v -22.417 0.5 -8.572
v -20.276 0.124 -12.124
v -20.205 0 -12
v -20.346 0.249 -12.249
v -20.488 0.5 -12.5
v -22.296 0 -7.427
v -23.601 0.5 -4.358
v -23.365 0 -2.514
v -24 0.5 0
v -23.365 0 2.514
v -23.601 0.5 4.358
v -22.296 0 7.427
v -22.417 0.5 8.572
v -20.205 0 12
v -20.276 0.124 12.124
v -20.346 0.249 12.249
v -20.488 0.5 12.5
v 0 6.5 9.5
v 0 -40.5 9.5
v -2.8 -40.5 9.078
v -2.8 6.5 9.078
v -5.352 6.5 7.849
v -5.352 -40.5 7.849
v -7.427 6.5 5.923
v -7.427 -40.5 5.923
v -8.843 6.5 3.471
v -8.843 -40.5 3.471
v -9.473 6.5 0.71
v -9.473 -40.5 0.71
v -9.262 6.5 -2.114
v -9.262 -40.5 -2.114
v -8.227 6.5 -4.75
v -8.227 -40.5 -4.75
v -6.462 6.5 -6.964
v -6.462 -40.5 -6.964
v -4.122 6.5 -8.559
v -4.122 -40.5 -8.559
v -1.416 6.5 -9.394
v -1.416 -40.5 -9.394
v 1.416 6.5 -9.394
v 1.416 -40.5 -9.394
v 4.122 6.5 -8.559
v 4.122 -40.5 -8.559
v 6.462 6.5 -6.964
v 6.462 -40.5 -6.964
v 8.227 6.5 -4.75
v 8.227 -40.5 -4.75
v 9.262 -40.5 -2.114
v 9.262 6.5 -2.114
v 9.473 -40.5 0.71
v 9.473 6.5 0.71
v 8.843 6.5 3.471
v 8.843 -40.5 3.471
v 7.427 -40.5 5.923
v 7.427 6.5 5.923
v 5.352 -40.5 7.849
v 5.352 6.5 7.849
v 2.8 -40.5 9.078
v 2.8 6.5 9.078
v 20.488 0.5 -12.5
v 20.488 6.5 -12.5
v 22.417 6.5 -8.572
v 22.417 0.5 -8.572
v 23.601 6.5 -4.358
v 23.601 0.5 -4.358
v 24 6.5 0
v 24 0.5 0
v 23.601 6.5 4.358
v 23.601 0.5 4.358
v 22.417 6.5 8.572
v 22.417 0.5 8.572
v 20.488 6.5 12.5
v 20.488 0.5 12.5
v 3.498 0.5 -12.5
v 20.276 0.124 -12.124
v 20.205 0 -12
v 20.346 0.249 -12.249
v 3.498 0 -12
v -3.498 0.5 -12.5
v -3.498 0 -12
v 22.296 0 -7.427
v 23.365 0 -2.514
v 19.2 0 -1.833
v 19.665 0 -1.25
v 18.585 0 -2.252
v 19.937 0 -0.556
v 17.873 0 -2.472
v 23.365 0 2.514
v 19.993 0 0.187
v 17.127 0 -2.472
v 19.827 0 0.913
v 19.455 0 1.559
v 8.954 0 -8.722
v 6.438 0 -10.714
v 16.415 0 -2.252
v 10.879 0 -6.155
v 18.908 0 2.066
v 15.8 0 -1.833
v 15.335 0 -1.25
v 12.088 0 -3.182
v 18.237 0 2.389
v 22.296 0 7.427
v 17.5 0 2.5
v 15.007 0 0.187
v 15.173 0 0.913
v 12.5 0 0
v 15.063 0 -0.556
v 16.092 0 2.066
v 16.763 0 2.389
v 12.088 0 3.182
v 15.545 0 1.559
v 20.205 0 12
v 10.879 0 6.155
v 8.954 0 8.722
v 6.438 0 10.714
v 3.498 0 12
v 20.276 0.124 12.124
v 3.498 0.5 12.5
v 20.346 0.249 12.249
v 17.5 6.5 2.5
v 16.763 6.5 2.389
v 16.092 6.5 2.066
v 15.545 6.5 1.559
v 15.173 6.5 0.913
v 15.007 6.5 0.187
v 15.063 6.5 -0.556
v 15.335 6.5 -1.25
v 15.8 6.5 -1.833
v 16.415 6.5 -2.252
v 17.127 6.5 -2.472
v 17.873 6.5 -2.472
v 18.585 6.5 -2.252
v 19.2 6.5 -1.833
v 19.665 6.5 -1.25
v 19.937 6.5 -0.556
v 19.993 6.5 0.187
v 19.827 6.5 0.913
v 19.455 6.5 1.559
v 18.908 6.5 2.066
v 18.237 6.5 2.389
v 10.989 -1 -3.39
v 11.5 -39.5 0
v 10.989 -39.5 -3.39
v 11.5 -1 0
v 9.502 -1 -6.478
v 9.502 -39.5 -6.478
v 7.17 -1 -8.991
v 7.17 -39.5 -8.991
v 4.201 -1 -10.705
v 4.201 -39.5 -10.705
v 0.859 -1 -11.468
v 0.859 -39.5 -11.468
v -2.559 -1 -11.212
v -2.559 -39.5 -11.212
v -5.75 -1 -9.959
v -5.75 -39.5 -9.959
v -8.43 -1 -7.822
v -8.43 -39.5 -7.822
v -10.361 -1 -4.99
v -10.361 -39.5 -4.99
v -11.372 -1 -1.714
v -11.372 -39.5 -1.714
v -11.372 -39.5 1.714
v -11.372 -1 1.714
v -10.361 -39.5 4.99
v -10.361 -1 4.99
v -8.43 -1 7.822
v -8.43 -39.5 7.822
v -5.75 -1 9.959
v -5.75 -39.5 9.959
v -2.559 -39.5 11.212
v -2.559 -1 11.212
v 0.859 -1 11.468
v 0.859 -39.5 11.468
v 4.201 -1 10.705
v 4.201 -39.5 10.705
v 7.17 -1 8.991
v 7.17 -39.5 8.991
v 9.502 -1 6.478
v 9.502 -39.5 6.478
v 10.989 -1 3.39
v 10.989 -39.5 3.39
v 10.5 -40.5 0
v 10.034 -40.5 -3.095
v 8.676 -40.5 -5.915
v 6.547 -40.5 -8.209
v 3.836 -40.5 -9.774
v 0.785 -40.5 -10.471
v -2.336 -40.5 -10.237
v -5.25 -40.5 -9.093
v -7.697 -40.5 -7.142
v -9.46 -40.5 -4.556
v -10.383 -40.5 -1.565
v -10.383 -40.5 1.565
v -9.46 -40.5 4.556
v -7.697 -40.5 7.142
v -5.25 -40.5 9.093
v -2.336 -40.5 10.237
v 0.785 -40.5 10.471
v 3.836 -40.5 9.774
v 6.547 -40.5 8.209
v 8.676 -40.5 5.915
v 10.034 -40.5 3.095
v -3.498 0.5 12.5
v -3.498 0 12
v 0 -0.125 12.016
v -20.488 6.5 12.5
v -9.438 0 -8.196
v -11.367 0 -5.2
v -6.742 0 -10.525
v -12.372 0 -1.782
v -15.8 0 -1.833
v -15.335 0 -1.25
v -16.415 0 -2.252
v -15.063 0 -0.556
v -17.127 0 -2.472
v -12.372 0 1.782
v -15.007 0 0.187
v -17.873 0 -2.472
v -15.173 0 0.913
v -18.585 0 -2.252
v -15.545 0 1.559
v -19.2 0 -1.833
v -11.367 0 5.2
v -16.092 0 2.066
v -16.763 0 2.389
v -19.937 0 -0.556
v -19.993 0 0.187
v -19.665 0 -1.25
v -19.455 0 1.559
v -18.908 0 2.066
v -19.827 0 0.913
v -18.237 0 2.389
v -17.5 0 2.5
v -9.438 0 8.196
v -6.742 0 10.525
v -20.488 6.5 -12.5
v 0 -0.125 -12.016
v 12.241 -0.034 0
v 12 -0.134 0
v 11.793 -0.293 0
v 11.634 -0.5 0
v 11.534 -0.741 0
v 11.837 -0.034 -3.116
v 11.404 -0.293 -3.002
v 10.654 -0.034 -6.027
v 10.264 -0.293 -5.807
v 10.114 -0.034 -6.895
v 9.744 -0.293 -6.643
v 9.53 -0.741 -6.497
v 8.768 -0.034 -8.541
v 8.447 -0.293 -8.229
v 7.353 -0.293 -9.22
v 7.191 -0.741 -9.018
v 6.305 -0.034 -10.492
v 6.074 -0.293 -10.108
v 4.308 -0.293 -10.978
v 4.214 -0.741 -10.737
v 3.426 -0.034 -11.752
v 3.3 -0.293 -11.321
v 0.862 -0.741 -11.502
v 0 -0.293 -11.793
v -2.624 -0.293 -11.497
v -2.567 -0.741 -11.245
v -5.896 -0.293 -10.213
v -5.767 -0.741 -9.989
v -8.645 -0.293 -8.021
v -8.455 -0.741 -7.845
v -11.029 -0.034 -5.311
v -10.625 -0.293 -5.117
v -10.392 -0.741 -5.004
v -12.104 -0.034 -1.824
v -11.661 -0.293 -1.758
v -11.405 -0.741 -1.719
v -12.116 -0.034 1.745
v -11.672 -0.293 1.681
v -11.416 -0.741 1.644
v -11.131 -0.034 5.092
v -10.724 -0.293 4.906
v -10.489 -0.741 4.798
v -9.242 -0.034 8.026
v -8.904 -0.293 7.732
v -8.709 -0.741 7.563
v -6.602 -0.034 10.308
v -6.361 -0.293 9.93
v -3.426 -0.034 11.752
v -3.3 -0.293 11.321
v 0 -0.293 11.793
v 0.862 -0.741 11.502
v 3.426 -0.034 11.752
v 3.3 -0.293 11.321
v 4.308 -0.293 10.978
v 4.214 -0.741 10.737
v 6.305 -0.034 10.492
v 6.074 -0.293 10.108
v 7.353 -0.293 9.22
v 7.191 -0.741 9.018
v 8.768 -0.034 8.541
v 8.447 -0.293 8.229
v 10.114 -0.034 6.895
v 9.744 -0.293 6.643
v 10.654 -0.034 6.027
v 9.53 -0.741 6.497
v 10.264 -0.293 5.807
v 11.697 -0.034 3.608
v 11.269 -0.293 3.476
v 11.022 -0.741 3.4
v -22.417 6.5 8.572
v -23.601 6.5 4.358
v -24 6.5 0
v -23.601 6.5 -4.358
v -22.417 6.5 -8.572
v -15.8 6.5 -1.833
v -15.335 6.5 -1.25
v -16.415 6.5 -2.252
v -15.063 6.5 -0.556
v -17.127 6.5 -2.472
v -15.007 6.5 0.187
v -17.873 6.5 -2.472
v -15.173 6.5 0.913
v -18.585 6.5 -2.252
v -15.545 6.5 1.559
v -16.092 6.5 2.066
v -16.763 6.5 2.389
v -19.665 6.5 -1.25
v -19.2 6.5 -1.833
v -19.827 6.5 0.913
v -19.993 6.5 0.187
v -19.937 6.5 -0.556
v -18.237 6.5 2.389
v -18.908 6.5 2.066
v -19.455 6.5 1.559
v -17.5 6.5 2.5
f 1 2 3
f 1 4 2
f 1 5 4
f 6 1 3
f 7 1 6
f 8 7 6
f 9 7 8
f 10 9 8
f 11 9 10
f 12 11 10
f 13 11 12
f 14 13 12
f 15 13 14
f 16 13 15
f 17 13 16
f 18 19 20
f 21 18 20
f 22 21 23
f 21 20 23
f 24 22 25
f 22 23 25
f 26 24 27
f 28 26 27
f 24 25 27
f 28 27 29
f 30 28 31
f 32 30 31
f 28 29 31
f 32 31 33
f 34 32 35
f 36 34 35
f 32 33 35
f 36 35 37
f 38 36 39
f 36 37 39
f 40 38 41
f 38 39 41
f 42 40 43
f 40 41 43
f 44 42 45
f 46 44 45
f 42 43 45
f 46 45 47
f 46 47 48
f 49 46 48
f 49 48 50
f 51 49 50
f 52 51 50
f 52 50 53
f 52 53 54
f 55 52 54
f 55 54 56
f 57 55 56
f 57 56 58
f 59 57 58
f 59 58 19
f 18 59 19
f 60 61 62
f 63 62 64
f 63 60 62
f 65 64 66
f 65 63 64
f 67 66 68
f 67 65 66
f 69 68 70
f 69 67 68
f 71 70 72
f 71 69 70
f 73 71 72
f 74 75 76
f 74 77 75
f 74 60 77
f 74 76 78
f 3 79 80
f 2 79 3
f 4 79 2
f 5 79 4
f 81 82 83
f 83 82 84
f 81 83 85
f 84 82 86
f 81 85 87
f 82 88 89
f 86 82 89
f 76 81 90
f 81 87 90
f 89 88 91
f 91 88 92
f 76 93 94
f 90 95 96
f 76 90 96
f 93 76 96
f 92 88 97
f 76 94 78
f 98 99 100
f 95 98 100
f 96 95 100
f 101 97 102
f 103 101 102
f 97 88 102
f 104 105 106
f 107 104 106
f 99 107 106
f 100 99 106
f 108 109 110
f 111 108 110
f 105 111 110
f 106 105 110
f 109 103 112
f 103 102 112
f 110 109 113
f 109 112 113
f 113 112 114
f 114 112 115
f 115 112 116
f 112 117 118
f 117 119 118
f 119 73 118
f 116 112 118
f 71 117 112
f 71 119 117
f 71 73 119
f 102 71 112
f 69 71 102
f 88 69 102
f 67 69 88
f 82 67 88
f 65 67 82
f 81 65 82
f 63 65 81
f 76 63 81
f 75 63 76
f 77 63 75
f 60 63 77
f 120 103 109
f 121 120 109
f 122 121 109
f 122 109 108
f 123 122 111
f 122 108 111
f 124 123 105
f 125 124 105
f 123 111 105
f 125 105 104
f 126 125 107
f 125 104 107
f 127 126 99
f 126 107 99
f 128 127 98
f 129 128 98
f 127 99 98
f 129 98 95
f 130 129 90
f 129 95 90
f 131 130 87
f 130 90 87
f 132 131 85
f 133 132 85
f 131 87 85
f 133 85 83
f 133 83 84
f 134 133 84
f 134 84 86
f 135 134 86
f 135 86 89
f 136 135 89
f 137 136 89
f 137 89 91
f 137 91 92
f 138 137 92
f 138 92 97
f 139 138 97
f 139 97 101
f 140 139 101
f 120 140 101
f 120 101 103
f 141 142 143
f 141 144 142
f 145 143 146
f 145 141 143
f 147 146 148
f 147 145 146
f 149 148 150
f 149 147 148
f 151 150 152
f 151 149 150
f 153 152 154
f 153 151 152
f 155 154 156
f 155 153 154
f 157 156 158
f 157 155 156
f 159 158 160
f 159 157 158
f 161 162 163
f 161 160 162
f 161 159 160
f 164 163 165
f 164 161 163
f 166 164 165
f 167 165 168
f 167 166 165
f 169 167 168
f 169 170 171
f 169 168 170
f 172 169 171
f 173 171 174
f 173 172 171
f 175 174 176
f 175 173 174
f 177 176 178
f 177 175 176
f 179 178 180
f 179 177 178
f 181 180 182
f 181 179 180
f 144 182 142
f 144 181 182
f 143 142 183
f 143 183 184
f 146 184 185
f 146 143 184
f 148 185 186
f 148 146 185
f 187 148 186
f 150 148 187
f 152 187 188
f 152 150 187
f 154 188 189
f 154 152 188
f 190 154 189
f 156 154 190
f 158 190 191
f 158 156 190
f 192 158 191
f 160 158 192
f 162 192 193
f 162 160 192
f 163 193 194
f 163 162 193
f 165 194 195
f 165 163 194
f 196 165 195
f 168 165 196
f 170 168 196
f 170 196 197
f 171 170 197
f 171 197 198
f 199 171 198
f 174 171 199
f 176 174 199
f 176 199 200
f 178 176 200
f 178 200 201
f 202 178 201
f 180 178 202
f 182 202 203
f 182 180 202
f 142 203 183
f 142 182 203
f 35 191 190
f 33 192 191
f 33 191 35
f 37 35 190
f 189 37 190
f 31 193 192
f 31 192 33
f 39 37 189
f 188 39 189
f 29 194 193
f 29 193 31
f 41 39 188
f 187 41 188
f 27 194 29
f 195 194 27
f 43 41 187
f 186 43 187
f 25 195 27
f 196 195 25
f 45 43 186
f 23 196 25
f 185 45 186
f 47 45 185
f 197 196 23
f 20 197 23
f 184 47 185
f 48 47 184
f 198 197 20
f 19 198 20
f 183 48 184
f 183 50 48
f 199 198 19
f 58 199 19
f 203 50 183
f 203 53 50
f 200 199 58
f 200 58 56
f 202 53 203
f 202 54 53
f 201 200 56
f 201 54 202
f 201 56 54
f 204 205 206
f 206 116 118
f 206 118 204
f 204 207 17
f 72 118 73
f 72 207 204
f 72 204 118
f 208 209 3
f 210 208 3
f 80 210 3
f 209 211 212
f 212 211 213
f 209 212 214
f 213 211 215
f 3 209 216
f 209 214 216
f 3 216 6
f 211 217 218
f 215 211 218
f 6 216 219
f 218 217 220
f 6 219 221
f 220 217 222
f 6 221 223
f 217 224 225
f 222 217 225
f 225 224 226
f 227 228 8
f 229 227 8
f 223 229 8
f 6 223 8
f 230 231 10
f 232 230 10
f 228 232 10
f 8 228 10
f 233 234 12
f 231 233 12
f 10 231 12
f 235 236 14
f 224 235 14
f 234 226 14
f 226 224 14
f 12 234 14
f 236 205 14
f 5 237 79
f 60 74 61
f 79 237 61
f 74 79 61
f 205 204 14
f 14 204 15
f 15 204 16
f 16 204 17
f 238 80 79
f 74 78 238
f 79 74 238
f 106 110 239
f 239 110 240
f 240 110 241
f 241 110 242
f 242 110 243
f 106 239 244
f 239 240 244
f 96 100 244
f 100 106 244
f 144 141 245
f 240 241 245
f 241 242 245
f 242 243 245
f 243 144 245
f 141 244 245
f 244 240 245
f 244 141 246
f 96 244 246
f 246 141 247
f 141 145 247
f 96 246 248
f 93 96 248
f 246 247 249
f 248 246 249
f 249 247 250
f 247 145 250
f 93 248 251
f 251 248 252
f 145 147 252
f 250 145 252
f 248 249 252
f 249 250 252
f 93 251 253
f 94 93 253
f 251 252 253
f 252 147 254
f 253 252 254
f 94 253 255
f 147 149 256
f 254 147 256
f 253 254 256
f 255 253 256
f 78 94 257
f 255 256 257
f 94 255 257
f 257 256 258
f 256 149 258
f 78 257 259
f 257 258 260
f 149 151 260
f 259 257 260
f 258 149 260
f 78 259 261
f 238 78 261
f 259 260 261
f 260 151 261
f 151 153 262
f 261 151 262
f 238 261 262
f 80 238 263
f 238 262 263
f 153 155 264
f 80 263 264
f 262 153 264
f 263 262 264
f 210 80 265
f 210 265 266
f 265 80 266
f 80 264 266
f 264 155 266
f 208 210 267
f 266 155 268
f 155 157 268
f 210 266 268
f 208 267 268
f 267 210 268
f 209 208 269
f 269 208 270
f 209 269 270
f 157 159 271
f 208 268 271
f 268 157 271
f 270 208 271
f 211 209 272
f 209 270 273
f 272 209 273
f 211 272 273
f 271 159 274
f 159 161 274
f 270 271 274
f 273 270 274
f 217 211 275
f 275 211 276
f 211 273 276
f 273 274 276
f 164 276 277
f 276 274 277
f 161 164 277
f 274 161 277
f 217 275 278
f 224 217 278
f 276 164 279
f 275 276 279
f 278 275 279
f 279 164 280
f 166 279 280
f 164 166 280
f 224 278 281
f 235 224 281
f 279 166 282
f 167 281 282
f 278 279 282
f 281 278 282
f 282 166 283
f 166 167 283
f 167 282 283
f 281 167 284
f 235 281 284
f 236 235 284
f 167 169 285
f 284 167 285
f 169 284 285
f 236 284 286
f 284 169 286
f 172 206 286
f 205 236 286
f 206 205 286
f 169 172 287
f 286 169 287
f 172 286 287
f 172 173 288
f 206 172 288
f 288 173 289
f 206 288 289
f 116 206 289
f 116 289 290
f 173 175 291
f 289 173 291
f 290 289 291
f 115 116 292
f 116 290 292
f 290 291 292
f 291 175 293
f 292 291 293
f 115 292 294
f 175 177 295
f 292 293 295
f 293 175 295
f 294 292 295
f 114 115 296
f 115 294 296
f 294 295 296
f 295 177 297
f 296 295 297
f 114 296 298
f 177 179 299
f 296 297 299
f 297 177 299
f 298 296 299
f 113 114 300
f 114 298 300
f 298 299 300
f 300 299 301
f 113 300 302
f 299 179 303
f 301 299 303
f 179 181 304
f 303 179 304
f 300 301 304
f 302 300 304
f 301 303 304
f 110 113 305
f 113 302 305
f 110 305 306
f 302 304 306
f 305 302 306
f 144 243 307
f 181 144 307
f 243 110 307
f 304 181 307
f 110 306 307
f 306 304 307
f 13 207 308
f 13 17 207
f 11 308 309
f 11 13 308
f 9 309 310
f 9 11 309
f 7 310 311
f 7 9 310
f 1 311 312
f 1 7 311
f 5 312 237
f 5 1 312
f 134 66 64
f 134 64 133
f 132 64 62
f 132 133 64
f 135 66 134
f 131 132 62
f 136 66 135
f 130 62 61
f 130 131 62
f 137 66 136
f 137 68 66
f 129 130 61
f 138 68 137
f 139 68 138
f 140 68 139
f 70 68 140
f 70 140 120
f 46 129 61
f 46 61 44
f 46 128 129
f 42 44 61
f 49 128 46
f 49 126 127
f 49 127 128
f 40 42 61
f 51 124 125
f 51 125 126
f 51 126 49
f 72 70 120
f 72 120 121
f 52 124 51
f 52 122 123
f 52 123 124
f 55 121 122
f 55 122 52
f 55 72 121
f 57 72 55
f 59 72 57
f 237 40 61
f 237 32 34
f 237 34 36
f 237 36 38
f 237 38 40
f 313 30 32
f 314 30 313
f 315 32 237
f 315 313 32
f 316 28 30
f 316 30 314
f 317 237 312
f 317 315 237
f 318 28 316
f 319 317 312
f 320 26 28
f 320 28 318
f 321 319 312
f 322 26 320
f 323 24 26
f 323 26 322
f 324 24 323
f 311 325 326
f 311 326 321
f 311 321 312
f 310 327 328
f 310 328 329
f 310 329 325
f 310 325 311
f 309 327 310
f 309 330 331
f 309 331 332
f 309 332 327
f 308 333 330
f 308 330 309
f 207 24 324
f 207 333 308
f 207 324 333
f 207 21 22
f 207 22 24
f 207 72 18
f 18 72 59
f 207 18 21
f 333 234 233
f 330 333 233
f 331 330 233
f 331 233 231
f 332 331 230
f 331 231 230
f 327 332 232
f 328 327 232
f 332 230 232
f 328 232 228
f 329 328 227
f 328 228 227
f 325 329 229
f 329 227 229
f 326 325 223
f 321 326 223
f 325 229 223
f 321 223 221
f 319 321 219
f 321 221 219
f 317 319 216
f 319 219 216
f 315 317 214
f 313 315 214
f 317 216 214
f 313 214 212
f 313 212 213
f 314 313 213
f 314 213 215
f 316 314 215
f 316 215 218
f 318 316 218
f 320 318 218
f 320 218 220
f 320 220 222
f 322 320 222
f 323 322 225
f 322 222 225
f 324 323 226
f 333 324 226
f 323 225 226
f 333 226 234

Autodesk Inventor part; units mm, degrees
ref_plane "YZ Plane" through (0, 0, 0) normal (1, 0, 0) x (0, 1, 0)
ref_plane "XZ Plane" through (0, 0, 0) normal (0, 1, 0) x (-1, 0, 0)
ref_plane "XY Plane" through (0, 0, 0) normal (0, 0, 1) x (1, 0, 0)
sketch "Skizze1" plane through (0, 0, 0) normal (0, 1, 0) x (-1, 0, 0)
  circle A0 centre (0, 0) radius 24
  dimension "d0" = 48
extrude "Extrusion1" add sketch "Skizze1" along normal blind 6.5
sketch "Skizze2" plane through (0, 6.5, 0) normal (0, 1, 0) x (1, 0, 0)
  circle A0 centre (0, 0) radius 24 projected
  line L0 (-20.4878, -12.5) -> (20.4878, -12.5)
  circle A1 centre (0, 0) radius 24 projected
  line L1 (-20.4878, 12.5) -> (20.4878, 12.5)
  line L2 (-24, 0) -> (24, 0) construction
  dimension "d3" = 12.5
  dimension "d4" = 12.5
extrude "Extrusion2" cut sketch "Skizze2" against normal up to surface (6.5 mm away) contours L1 A0 | A0 L0
sketch "Skizze3" plane through (0, 0, 0) normal (0, -1, 0) x (1, 0, 0)
  circle A0 centre (0, 0) radius 11.5
  dimension "d7" = 23
extrude "Extrusion3" add sketch "Skizze3" along normal blind 40.5
sketch "Skizze4" plane through (0, 6.5, 0) normal (0, 1, 0) x (1, 0, 0)
  point P0 (0, 0)
  point P1 (0, 0)
hole "Bohrung1" at (0, 6.5, 0) direction (0, -1, 0) diameter 19 depth 47
sketch "Skizze5" plane through (0, 6.5, 0) normal (0, 1, 0) x (1, 0, 0)
  line L0 (-20.4878, -12.5) -> (20.4878, -12.5) projected
  point P0 (0, 0)
  point P1 (17.5, 0)
  point P2 (-17.5, 0)
  dimension "d25" = 12.5
  dimension "d26" = 12.5
  dimension "d27" = 17.5
  dimension "d28" = 17.5
hole "Bohrung2" at (17.5, 6.5, 0) at (-17.5, 6.5, 0) direction (0, -1, 0) diameter 5 depth 6.5
fillet "Rundung1" radius 1 1 edges at (-11.5, 0, 0)
chamfer "Fasen1" distance 1 angle 45 1 edges at (-11.5, -40.5, 0)
chamfer "Fasen2" distance 0.5 angle 45 4 edges at (0, 0, -12.5) (-24, 0, 0) (24, 0, 0) (0, 0, 12.5)
properties part number "11" material "Acetalharz, Weiß"
